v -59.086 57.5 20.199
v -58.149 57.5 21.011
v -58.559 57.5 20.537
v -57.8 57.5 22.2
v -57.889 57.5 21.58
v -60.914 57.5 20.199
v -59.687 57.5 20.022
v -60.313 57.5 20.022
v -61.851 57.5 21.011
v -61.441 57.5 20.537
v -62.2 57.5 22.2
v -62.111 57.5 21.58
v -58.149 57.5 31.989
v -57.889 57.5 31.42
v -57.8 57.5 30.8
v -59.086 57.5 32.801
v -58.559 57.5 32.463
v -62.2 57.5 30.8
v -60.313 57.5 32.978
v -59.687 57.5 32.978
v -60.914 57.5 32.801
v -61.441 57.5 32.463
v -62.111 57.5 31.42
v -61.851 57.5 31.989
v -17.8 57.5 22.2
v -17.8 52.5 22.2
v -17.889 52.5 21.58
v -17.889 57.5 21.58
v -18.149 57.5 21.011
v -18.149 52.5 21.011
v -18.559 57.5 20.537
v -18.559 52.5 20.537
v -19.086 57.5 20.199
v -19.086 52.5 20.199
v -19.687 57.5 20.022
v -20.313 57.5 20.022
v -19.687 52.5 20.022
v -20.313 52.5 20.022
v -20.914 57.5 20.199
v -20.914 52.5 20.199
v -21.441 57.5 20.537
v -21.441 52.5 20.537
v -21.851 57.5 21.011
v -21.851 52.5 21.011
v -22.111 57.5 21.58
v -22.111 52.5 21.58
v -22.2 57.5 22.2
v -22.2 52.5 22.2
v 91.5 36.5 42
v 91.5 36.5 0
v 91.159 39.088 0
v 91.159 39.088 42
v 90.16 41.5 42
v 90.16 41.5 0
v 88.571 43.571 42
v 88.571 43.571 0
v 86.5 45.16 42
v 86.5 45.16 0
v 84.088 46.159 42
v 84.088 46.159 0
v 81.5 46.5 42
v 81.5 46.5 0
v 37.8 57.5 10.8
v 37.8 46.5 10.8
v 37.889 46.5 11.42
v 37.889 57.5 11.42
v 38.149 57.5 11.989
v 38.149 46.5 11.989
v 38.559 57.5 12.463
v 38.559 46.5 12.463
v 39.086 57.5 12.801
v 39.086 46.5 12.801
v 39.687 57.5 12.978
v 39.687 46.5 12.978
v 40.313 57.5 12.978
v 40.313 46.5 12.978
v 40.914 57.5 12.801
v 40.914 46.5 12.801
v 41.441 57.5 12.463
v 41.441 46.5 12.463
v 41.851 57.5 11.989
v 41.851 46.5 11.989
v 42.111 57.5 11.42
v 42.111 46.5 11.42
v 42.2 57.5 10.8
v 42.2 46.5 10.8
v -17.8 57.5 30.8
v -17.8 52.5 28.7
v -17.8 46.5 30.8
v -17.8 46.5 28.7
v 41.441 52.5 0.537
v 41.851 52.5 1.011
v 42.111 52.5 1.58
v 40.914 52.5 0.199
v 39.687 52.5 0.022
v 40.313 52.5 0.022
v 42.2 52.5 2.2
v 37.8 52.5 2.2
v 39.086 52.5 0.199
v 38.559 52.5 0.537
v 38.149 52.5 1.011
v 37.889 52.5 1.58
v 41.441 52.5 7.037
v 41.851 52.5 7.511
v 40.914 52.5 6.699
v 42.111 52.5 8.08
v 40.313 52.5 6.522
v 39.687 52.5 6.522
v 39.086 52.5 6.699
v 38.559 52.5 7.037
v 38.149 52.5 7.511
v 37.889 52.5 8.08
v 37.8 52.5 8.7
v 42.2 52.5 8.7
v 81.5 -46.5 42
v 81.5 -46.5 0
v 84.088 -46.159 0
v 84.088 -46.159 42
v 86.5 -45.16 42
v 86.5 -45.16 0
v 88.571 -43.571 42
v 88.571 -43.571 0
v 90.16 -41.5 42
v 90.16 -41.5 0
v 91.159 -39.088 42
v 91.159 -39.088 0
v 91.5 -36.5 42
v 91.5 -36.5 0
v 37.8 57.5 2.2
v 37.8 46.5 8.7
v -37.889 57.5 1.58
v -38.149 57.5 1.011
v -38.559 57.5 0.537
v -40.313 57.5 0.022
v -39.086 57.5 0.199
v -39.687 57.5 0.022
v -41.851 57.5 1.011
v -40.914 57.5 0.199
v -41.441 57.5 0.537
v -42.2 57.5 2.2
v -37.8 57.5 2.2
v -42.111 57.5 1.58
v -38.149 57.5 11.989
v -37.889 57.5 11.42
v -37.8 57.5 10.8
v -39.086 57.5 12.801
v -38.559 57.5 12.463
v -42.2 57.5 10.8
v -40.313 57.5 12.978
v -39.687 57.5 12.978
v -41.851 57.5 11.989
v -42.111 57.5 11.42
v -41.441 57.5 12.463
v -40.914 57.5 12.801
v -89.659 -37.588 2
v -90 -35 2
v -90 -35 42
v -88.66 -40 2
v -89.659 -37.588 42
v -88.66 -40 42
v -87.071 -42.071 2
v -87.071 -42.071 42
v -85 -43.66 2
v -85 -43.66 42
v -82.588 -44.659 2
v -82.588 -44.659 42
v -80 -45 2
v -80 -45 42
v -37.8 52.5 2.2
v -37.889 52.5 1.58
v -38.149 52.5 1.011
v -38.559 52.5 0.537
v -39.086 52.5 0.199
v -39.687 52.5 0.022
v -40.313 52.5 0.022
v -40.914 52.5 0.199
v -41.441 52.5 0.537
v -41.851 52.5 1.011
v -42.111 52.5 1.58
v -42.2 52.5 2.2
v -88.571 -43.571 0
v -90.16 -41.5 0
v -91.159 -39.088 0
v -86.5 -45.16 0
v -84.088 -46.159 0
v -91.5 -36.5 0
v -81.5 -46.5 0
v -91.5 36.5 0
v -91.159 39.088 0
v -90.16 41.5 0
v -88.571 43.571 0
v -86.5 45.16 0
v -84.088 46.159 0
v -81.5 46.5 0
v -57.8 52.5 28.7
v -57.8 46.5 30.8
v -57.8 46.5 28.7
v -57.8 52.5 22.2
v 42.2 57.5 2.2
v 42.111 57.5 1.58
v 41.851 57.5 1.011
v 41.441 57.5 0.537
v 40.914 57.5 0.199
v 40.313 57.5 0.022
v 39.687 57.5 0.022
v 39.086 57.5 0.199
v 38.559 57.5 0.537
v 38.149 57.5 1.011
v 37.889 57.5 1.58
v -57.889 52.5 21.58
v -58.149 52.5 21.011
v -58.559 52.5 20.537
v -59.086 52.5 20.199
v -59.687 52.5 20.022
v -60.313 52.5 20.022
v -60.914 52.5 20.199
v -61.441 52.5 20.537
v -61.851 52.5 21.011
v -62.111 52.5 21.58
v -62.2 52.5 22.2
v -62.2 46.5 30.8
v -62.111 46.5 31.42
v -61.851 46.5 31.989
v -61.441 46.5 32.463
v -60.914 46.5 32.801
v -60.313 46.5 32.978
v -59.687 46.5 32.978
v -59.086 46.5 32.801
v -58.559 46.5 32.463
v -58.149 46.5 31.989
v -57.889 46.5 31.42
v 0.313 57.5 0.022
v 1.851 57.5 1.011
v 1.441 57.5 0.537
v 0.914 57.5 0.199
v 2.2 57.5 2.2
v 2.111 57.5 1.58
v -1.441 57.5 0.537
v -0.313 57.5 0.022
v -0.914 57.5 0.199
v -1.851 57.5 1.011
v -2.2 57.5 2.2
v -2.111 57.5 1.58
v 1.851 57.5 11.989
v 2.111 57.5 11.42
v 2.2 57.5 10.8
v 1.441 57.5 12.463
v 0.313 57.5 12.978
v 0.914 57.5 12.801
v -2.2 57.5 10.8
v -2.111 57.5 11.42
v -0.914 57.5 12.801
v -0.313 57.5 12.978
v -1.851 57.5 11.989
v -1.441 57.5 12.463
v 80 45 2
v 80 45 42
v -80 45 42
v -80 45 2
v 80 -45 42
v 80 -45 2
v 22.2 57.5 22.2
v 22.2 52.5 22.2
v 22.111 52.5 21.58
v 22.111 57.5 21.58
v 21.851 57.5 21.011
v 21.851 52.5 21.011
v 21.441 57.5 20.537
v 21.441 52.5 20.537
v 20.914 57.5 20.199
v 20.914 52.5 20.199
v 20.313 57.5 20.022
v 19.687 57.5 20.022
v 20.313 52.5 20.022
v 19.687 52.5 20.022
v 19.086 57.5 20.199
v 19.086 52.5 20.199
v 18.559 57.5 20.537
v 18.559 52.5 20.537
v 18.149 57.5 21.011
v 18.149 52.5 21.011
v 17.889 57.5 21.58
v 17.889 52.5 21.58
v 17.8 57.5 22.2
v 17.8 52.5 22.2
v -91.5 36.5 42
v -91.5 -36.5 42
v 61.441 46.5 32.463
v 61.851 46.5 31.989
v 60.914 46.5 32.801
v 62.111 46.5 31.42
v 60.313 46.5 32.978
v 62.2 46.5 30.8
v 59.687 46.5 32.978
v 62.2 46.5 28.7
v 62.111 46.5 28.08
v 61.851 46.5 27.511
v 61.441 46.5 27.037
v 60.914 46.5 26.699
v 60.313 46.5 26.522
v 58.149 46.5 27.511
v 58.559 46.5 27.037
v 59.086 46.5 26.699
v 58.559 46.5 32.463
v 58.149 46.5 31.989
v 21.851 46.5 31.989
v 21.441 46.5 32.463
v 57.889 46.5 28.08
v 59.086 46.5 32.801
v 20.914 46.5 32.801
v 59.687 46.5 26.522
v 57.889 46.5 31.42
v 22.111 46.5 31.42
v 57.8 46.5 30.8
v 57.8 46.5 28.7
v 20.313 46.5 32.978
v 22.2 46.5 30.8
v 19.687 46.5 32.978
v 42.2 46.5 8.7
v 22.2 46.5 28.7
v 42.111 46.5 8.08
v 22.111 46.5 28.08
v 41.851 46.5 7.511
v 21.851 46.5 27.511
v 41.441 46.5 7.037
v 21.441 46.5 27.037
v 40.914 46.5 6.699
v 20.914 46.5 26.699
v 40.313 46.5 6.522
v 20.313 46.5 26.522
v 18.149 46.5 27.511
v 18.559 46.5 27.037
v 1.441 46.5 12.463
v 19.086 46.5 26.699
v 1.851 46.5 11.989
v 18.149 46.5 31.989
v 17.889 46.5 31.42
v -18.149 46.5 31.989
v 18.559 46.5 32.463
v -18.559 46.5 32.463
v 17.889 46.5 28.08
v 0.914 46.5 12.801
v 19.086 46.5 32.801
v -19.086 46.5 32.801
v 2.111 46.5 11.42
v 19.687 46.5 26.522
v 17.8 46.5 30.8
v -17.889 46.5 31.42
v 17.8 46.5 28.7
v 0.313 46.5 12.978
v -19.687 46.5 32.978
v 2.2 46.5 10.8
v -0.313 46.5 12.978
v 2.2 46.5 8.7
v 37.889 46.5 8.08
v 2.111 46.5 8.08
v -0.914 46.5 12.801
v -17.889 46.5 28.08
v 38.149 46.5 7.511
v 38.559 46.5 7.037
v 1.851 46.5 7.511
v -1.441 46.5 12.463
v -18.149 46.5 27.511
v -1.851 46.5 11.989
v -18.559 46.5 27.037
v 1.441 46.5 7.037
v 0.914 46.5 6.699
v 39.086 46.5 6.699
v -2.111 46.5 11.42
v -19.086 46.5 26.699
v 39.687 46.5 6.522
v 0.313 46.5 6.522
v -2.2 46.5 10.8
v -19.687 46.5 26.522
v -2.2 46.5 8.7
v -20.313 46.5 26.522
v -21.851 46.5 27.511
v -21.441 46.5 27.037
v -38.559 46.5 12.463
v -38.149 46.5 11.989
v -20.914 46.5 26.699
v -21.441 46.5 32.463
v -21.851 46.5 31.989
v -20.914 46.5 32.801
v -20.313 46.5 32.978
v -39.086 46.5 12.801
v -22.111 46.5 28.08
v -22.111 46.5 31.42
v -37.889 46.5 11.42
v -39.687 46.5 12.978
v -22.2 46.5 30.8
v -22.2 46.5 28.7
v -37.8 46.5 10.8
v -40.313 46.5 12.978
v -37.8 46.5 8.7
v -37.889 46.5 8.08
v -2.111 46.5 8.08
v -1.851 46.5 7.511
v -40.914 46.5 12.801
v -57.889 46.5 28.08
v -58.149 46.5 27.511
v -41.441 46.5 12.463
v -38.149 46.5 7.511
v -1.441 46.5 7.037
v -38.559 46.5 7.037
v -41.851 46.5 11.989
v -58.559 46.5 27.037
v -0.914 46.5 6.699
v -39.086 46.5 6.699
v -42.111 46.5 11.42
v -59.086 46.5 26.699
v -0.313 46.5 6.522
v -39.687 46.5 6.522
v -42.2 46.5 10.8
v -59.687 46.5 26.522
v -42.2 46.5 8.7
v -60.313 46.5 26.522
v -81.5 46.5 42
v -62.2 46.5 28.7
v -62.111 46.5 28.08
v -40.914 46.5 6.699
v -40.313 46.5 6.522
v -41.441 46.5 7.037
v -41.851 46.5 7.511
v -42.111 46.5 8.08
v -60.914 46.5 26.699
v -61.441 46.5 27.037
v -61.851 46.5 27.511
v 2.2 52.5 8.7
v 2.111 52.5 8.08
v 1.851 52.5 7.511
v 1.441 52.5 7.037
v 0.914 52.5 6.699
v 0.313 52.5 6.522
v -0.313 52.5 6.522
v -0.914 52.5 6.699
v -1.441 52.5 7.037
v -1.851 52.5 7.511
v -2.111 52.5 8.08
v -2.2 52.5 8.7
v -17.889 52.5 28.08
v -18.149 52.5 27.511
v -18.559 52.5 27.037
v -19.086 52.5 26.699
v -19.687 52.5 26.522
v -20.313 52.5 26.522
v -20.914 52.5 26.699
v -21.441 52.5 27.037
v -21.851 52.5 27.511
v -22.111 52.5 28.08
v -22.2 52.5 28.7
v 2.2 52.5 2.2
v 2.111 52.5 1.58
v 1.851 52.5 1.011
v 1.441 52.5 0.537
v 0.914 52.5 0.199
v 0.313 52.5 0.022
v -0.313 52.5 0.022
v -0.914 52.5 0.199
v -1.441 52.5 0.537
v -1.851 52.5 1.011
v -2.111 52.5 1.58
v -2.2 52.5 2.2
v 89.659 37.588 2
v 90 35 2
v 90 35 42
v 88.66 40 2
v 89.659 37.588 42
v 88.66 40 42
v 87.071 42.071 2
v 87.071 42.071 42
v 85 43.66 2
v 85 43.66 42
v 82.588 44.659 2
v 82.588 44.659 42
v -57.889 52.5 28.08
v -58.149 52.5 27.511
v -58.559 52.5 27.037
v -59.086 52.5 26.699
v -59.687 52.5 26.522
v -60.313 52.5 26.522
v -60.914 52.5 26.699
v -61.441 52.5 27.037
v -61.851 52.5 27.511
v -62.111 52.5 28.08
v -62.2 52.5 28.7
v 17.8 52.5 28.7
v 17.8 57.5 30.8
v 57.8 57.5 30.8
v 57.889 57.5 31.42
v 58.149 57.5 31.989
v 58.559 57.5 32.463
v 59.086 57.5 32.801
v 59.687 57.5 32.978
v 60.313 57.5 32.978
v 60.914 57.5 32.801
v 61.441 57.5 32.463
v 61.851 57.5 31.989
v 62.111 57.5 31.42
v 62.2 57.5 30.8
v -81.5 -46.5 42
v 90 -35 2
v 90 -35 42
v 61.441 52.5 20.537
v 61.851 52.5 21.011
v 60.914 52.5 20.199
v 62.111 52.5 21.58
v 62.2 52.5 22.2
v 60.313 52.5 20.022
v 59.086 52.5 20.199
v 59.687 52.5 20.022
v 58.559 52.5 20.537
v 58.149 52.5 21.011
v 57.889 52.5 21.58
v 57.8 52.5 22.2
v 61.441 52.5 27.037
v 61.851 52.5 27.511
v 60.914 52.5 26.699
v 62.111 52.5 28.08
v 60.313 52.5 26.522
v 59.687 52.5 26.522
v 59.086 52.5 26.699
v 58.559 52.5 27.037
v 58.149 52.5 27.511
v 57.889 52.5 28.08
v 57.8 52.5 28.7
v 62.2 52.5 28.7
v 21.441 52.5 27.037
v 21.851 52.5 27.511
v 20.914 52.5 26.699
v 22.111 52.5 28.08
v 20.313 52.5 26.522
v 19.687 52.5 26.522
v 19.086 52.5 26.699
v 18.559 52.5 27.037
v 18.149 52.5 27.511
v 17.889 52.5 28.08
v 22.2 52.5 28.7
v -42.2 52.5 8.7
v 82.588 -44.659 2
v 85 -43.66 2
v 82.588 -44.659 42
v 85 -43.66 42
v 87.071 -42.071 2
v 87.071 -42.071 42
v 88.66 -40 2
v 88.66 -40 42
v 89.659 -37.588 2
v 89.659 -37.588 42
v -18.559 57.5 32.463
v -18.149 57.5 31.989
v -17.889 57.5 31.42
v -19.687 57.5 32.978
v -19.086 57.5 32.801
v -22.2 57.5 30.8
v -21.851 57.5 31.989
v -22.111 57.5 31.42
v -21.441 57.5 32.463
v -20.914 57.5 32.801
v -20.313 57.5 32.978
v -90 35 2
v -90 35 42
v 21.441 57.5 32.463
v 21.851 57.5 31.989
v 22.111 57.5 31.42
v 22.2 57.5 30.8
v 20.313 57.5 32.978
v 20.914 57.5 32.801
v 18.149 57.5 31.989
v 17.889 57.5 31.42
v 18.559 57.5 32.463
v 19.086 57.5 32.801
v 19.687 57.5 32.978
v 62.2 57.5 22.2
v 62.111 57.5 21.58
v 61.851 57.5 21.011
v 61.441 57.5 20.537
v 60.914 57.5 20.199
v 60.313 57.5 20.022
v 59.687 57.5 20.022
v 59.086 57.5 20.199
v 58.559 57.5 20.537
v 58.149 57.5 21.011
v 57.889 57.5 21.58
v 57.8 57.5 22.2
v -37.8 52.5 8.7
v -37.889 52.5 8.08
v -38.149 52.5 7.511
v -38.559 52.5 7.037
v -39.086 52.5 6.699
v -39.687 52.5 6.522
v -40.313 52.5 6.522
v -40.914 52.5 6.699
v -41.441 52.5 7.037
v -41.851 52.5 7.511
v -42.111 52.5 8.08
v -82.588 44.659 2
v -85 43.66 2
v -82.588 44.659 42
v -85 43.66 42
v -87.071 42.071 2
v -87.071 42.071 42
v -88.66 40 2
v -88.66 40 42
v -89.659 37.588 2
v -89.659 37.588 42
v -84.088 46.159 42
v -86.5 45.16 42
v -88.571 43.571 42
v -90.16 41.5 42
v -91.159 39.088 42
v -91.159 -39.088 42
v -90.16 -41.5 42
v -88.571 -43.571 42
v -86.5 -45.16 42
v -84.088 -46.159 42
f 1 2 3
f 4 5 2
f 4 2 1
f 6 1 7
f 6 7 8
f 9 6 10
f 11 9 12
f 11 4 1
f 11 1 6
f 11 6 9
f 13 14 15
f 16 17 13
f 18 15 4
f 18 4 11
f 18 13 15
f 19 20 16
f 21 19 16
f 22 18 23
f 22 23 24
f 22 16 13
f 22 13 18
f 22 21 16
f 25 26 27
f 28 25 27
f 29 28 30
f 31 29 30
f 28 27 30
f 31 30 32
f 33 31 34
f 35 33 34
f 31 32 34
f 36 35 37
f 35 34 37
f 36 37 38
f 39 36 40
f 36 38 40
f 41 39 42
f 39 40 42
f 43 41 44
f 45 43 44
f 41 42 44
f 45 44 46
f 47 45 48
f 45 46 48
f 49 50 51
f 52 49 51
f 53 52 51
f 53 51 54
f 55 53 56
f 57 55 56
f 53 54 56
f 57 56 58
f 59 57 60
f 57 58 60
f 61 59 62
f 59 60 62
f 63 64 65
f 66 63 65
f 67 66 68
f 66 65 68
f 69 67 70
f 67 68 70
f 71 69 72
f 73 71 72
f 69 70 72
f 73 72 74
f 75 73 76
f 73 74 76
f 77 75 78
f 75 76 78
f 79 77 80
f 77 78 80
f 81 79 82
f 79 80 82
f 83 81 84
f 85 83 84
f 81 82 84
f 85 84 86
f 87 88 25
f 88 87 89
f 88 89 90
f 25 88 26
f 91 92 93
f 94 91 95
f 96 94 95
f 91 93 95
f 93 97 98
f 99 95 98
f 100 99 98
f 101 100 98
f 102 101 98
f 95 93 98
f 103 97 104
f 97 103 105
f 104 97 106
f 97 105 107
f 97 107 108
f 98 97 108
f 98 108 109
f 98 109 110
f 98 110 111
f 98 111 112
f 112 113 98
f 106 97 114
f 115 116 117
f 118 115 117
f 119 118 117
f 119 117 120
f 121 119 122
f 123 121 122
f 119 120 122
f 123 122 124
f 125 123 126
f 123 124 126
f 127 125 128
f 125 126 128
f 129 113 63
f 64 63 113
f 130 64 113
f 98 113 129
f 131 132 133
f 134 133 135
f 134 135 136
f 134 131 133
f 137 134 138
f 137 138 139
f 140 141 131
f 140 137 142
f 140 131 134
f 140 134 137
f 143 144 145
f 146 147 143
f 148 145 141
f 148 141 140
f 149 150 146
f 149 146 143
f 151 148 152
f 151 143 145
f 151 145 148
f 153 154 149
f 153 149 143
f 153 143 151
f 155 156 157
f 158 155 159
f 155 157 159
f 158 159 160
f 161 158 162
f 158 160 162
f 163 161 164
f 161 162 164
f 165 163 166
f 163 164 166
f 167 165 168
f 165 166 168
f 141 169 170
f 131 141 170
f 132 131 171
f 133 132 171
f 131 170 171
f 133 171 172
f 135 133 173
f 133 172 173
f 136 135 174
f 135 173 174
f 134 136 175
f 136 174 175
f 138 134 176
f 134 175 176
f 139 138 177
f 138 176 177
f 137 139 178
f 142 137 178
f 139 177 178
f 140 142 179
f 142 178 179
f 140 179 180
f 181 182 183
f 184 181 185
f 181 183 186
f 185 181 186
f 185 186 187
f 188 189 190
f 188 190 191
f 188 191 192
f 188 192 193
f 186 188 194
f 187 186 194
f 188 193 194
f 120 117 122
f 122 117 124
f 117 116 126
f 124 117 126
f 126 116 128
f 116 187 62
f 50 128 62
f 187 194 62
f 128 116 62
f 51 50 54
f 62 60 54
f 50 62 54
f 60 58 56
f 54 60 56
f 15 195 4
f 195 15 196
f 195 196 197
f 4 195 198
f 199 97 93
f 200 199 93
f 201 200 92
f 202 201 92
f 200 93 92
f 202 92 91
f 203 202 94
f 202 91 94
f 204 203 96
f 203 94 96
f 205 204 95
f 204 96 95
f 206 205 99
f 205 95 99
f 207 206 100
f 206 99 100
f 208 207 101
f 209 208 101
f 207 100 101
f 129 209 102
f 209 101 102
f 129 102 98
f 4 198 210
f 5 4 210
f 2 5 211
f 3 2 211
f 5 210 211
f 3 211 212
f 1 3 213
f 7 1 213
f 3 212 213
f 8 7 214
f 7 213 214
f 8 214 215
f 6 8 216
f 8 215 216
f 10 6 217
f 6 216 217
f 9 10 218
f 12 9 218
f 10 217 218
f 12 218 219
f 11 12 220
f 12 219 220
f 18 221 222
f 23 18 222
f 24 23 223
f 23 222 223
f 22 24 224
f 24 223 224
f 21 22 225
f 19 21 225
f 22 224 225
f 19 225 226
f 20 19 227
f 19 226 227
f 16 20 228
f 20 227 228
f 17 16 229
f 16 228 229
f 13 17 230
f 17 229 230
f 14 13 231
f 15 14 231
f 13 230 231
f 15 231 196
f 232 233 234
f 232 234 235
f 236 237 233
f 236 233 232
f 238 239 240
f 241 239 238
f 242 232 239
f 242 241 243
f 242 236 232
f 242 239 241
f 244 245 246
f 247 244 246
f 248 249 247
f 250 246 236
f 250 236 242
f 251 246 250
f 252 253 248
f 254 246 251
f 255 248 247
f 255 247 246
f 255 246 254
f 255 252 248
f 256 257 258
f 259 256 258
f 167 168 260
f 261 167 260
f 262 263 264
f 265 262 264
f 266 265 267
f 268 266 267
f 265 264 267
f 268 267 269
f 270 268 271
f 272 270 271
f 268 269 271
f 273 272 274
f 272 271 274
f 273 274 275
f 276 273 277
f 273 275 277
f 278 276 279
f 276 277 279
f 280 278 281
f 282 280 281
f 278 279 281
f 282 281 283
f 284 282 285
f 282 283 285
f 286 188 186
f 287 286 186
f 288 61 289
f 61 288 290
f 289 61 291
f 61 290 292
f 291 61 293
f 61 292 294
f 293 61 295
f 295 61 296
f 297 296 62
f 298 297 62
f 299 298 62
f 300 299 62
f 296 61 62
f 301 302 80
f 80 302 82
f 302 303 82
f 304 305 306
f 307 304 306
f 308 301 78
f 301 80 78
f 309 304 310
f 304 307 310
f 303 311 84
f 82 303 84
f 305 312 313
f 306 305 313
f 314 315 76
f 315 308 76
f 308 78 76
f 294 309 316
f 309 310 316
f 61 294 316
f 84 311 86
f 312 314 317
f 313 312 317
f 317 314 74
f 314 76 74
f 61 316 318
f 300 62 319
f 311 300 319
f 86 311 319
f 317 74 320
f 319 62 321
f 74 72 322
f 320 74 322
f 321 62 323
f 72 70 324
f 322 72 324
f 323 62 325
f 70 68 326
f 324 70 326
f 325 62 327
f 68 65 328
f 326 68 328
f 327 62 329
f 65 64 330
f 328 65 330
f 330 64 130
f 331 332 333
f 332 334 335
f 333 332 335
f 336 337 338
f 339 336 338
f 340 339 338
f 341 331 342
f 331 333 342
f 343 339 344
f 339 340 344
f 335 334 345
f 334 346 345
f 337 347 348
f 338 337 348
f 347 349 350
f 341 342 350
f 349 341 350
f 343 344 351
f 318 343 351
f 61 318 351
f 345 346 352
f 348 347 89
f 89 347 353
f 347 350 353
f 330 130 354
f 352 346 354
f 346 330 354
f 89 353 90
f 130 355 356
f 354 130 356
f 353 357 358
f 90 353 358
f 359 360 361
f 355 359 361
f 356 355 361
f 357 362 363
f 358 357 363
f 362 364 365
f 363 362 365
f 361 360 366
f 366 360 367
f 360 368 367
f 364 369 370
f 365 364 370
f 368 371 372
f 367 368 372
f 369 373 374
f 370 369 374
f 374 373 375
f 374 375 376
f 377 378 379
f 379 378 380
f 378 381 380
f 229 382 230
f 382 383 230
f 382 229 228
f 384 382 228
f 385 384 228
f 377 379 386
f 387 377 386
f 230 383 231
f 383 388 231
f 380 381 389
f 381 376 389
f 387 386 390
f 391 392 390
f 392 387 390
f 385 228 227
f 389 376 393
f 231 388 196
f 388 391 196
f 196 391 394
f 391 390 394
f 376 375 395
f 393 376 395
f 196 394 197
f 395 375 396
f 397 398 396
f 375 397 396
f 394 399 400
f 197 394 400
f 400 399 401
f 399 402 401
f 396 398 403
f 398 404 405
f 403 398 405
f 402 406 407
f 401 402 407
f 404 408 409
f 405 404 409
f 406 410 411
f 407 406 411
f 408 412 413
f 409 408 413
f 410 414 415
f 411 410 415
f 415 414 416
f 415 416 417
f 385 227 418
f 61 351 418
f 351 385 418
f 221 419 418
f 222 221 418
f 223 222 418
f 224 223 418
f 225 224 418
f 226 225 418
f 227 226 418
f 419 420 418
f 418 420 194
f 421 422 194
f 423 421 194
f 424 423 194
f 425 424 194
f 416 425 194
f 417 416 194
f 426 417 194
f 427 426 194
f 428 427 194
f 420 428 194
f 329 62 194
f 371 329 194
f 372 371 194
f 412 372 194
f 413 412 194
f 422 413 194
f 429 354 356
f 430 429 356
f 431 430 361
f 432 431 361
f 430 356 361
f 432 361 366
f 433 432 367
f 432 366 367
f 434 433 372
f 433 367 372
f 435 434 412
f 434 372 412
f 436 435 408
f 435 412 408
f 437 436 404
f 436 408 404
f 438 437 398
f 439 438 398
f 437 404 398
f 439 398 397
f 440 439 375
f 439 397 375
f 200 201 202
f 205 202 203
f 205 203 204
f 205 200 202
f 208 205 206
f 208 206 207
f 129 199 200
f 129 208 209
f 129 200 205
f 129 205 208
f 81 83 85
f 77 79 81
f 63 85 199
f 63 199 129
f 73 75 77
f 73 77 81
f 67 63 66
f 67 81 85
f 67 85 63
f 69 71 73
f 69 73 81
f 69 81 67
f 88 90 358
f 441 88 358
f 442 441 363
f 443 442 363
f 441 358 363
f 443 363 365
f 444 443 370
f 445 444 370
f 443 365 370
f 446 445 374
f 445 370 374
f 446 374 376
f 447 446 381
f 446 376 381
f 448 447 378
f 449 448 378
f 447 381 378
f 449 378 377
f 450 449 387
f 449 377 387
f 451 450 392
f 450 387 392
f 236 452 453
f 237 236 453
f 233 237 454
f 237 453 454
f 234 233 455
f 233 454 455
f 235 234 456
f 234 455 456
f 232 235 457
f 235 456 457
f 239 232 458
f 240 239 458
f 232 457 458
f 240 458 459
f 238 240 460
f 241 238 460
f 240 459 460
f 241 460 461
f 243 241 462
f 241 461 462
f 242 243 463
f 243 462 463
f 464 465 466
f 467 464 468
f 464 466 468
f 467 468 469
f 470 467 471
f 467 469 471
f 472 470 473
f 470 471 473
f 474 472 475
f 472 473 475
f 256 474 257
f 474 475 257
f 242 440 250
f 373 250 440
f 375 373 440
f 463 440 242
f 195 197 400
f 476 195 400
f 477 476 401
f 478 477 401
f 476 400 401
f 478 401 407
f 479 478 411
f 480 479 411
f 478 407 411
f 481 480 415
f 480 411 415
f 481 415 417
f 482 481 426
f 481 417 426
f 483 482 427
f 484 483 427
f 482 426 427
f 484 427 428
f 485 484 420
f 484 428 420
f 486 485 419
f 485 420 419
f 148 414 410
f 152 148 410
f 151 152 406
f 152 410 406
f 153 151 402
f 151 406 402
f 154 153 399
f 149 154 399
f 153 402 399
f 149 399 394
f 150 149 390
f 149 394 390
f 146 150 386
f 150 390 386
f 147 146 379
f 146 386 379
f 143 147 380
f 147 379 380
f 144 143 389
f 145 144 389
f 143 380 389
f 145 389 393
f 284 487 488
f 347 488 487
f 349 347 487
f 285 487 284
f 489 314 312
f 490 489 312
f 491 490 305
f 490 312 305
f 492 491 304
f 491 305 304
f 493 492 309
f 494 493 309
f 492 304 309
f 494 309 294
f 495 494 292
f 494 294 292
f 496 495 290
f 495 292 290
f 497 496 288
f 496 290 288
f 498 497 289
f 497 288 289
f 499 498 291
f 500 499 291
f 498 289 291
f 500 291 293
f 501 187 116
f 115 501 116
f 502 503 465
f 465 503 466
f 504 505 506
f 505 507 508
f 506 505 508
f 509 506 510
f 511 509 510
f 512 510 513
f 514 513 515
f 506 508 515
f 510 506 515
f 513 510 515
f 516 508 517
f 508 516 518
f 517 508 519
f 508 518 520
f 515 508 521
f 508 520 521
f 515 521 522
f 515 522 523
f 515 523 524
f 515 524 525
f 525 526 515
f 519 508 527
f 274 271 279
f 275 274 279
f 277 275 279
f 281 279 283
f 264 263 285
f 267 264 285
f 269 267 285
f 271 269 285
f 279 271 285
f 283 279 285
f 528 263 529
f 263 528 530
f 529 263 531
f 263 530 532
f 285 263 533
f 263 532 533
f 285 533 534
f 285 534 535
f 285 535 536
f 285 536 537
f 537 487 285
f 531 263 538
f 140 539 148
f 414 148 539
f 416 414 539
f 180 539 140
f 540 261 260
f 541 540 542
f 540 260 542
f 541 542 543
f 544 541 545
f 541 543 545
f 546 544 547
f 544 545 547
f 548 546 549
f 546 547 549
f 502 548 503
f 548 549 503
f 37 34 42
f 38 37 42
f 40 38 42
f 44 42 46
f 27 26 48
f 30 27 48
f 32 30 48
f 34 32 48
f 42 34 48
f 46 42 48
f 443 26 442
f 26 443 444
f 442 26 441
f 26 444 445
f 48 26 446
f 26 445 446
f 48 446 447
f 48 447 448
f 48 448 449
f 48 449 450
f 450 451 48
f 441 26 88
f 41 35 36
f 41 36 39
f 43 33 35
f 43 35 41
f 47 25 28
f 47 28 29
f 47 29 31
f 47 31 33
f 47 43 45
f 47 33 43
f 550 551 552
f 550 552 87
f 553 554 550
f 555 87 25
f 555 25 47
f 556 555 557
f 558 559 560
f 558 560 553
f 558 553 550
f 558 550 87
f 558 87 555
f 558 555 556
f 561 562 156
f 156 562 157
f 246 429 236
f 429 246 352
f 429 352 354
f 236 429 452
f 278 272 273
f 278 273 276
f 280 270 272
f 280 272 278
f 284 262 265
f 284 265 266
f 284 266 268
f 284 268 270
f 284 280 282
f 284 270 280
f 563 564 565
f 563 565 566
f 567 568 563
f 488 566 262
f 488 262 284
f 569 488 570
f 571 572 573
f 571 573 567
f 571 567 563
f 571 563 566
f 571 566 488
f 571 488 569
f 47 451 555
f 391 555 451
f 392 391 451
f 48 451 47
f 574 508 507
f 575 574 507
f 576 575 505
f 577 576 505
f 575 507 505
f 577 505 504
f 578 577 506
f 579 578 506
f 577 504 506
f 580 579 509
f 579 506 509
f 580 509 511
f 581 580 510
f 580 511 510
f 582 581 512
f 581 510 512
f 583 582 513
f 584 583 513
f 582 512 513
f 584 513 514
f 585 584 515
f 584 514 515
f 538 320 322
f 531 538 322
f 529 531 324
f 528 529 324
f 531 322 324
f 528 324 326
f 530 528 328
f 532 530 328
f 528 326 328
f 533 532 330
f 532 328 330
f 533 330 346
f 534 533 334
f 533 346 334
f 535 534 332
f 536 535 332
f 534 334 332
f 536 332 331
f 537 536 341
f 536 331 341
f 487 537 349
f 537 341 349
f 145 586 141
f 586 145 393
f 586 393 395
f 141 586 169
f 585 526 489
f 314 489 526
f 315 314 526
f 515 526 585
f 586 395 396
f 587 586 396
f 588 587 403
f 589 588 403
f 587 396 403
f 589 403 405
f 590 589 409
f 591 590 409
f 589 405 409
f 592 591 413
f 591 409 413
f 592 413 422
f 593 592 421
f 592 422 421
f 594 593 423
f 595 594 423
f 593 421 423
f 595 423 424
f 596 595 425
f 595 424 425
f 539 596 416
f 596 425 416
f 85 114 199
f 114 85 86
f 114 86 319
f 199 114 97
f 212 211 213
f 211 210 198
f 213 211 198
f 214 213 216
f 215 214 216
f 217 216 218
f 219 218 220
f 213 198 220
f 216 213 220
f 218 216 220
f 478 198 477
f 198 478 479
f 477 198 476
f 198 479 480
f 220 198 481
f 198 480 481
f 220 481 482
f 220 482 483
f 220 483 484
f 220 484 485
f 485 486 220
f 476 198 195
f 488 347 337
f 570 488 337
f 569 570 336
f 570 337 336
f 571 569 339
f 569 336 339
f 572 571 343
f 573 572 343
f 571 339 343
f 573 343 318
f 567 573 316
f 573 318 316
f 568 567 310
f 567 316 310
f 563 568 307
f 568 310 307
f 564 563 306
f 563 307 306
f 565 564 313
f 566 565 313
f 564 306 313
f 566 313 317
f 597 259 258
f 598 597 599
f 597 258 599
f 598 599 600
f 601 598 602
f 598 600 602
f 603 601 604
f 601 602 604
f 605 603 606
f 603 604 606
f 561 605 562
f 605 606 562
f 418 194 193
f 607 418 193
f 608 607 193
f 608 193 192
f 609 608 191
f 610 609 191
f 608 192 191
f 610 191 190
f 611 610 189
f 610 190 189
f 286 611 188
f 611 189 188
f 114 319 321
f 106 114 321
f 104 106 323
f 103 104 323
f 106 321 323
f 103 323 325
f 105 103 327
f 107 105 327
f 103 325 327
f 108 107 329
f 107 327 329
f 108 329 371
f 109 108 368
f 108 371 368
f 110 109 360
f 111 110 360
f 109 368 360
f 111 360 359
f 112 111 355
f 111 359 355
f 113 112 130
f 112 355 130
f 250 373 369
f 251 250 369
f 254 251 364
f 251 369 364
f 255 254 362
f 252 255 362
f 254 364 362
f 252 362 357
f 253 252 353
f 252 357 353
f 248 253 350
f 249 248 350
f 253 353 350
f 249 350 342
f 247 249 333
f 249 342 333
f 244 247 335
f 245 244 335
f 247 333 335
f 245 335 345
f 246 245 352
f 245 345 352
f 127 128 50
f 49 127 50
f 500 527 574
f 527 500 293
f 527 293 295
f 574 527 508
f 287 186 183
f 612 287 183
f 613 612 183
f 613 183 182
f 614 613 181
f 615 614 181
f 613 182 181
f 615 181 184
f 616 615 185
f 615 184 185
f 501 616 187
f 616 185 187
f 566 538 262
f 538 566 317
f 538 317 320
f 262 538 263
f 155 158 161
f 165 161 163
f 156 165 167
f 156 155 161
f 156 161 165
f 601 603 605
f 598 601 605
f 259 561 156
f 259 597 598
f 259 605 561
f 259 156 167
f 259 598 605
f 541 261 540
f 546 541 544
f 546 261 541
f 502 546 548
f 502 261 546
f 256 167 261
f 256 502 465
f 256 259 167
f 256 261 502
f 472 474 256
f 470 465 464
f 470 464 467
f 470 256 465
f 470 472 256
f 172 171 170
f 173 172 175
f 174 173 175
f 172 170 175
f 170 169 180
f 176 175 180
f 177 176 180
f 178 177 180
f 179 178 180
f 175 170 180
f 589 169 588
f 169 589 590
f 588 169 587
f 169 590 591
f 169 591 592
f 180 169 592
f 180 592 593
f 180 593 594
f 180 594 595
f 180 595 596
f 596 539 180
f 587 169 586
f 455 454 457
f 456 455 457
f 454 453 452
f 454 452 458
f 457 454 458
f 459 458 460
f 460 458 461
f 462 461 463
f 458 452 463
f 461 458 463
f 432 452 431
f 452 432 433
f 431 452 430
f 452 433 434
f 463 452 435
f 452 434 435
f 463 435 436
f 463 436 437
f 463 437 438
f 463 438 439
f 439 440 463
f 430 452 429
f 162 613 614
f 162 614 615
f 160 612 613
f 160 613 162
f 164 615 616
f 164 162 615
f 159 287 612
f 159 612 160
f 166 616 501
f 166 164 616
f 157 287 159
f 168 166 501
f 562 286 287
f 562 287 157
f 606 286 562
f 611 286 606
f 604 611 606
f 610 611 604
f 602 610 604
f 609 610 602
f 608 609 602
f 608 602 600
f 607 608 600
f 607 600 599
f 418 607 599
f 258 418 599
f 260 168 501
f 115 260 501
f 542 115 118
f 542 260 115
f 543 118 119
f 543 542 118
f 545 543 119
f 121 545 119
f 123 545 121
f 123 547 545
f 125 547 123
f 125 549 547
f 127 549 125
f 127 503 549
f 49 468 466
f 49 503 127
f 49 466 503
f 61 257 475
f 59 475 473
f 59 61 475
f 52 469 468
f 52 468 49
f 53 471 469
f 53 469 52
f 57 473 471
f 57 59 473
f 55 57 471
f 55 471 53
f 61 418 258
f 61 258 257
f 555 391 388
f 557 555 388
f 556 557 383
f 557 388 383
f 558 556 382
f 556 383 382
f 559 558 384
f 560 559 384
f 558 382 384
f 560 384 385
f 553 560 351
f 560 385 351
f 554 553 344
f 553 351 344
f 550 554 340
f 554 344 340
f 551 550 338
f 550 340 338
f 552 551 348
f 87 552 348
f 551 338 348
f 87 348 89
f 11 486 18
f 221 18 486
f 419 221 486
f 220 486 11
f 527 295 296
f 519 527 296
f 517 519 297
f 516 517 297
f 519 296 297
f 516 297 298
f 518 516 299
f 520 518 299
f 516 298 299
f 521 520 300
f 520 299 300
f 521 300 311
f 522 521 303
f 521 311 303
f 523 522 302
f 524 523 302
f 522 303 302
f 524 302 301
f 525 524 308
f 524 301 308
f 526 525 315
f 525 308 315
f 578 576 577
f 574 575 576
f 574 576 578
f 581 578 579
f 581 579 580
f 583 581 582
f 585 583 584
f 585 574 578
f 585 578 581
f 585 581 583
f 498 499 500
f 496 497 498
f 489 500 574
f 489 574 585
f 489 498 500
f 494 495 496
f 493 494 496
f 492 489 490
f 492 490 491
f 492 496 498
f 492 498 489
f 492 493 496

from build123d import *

# Parameters (mm, degrees)
PAD_DEPTH    = 42
POCKET_DEPTH = 40
PAD001_DEPTH = 6
PAD002_DEPTH = 5


with BuildPart() as part:
    # Sketch → Pad (new body)
    with BuildSketch(Plane.XY):
        with BuildLine():
            Line((-91.5, 36.5), (-91.5, -36.5))
            ThreePointArc((-91.5, -36.5), (-88.571068, -43.571068), (-81.5, -46.5))
            Line((-81.5, -46.5), (81.5, -46.5))
            ThreePointArc((81.5, -46.5), (88.571068, -43.571068), (91.5, -36.5))
            Line((91.5, -36.5), (91.5, 36.5))
            ThreePointArc((91.5, 36.5), (88.571068, 43.571068), (81.5, 46.5))
            Line((81.5, 46.5), (-81.5, 46.5))
            ThreePointArc((-81.5, 46.5), (-88.571068, 43.571068), (-91.5, 36.5))
        make_face()
    extrude(amount=PAD_DEPTH)

    # Sketch001 (on Face10 of Pad) → Pocket (cut)
    with BuildSketch(Plane.XY.offset(42)):
        with BuildLine():
            Line((-90, 35), (-90, -35))
            ThreePointArc((-90, -35), (-87.071068, -42.071068), (-80, -45))
            Line((-80, -45), (80, -45))
            ThreePointArc((80, -45), (87.071068, -42.071068), (90, -35))
            Line((90, -35), (90, 35))
            ThreePointArc((90, 35), (87.071068, 42.071068), (80, 45))
            Line((80, 45), (-80, 45))
            ThreePointArc((-80, 45), (-87.071068, 42.071068), (-90, 35))
        make_face()
    extrude(amount=-POCKET_DEPTH, mode=Mode.SUBTRACT)

    # Sketch002 (on Face6 of Pocket) → Pad001 (join)
    with BuildSketch(Plane(origin=(0, 46.5, 0), x_dir=(-1, 0, 0), z_dir=(0, 1, 0))):
        with BuildLine():
            ThreePointArc((-17.8, 30.8), (-20, 33), (-22.2, 30.8))
            Line((-22.2, 30.8), (-22.2, 28.7))
            ThreePointArc((-22.2, 28.7), (-20, 26.5), (-17.8, 28.7))
            Line((-17.8, 30.8), (-17.8, 28.7))
        make_face()
        with BuildLine():
            ThreePointArc((22.2, 30.8), (20, 33), (17.8, 30.8))
            Line((17.8, 30.8), (17.8, 28.7))
            ThreePointArc((17.8, 28.7), (20, 26.5), (22.2, 28.7))
            Line((22.2, 30.8), (22.2, 28.7))
        make_face()
        with BuildLine():
            ThreePointArc((62.2, 30.8), (60, 33), (57.8, 30.8))
            Line((57.8, 30.8), (57.8, 28.7))
            ThreePointArc((57.8, 28.7), (60, 26.5), (62.2, 28.7))
            Line((62.2, 30.8), (62.2, 28.7))
        make_face()
        with BuildLine():
            ThreePointArc((-37.8, 10.8), (-40, 13), (-42.2, 10.8))
            Line((-42.2, 10.8), (-42.2, 8.7))
            ThreePointArc((-42.2, 8.7), (-40, 6.5), (-37.8, 8.7))
            Line((-37.8, 10.8), (-37.8, 8.7))
        make_face()
        with BuildLine():
            ThreePointArc((2.2, 10.8), (0, 13), (-2.2, 10.8))
            Line((-2.2, 10.8), (-2.2, 8.7))
            ThreePointArc((-2.2, 8.7), (0, 6.5), (2.2, 8.7))
            Line((2.2, 10.8), (2.2, 8.7))
        make_face()
        with BuildLine():
            ThreePointArc((42.2, 10.8), (40, 13), (37.8, 10.8))
            Line((37.8, 10.8), (37.8, 8.7))
            ThreePointArc((37.8, 8.7), (40, 6.5), (42.2, 8.7))
            Line((42.2, 10.8), (42.2, 8.7))
        make_face()
        with BuildLine():
            ThreePointArc((-57.8, 30.8), (-60, 33), (-62.2, 30.8))
            Line((-62.2, 30.8), (-62.2, 28.7))
            ThreePointArc((-62.2, 28.7), (-60, 26.5), (-57.8, 28.7))
            Line((-57.8, 30.8), (-57.8, 28.7))
        make_face()
    extrude(amount=PAD001_DEPTH)

    # Sketch003 (on Face49 of Pad001) → Pad002 (join)
    with BuildSketch(Plane(origin=(0, 52.5, 0), x_dir=(-1, 0, 0), z_dir=(0, 1, 0))):
        with BuildLine():
            ThreePointArc((62.2, 30.8), (60, 33), (57.8, 30.8))
            Line((57.8, 30.8), (57.8, 22.2))
            ThreePointArc((57.8, 22.2), (60, 20), (62.2, 22.2))
            Line((62.2, 30.8), (62.2, 22.2))
        make_face()
        with BuildLine():
            ThreePointArc((22.2, 30.8), (20, 33), (17.8, 30.8))
            Line((17.8, 30.8), (17.8, 22.2))
            ThreePointArc((17.8, 22.2), (20, 20), (22.2, 22.2))
            Line((22.2, 30.8), (22.2, 22.2))
        make_face()
        with BuildLine():
            ThreePointArc((42.2, 10.8), (40, 13), (37.8, 10.8))
            Line((37.8, 10.8), (37.8, 2.2))
            ThreePointArc((37.8, 2.2), (40, 0), (42.2, 2.2))
            Line((42.2, 10.8), (42.2, 2.2))
        make_face()
        with BuildLine():
            ThreePointArc((-17.8, 30.8), (-20, 33), (-22.2, 30.8))
            Line((-22.2, 30.8), (-22.2, 22.2))
            ThreePointArc((-22.2, 22.2), (-20, 20), (-17.8, 22.2))
            Line((-17.8, 30.8), (-17.8, 22.2))
        make_face()
        with BuildLine():
            ThreePointArc((2.2, 10.8), (0, 13), (-2.2, 10.8))
            Line((-2.2, 10.8), (-2.2, 2.2))
            ThreePointArc((-2.2, 2.2), (0, 0), (2.2, 2.2))
            Line((2.2, 10.8), (2.2, 2.2))
        make_face()
        with BuildLine():
            ThreePointArc((-37.8, 10.8), (-40, 13), (-42.2, 10.8))
            Line((-42.2, 10.8), (-42.2, 2.2))
            ThreePointArc((-42.2, 2.2), (-40, 0), (-37.8, 2.2))
            Line((-37.8, 10.8), (-37.8, 2.2))
        make_face()
        with BuildLine():
            ThreePointArc((-57.8, 30.8), (-60, 33), (-62.2, 30.8))
            Line((-62.2, 30.8), (-62.2, 22.2))
            ThreePointArc((-62.2, 22.2), (-60, 20), (-57.8, 22.2))
            Line((-57.8, 30.8), (-57.8, 22.2))
        make_face()
    extrude(amount=PAD002_DEPTH)


solid = part.part
